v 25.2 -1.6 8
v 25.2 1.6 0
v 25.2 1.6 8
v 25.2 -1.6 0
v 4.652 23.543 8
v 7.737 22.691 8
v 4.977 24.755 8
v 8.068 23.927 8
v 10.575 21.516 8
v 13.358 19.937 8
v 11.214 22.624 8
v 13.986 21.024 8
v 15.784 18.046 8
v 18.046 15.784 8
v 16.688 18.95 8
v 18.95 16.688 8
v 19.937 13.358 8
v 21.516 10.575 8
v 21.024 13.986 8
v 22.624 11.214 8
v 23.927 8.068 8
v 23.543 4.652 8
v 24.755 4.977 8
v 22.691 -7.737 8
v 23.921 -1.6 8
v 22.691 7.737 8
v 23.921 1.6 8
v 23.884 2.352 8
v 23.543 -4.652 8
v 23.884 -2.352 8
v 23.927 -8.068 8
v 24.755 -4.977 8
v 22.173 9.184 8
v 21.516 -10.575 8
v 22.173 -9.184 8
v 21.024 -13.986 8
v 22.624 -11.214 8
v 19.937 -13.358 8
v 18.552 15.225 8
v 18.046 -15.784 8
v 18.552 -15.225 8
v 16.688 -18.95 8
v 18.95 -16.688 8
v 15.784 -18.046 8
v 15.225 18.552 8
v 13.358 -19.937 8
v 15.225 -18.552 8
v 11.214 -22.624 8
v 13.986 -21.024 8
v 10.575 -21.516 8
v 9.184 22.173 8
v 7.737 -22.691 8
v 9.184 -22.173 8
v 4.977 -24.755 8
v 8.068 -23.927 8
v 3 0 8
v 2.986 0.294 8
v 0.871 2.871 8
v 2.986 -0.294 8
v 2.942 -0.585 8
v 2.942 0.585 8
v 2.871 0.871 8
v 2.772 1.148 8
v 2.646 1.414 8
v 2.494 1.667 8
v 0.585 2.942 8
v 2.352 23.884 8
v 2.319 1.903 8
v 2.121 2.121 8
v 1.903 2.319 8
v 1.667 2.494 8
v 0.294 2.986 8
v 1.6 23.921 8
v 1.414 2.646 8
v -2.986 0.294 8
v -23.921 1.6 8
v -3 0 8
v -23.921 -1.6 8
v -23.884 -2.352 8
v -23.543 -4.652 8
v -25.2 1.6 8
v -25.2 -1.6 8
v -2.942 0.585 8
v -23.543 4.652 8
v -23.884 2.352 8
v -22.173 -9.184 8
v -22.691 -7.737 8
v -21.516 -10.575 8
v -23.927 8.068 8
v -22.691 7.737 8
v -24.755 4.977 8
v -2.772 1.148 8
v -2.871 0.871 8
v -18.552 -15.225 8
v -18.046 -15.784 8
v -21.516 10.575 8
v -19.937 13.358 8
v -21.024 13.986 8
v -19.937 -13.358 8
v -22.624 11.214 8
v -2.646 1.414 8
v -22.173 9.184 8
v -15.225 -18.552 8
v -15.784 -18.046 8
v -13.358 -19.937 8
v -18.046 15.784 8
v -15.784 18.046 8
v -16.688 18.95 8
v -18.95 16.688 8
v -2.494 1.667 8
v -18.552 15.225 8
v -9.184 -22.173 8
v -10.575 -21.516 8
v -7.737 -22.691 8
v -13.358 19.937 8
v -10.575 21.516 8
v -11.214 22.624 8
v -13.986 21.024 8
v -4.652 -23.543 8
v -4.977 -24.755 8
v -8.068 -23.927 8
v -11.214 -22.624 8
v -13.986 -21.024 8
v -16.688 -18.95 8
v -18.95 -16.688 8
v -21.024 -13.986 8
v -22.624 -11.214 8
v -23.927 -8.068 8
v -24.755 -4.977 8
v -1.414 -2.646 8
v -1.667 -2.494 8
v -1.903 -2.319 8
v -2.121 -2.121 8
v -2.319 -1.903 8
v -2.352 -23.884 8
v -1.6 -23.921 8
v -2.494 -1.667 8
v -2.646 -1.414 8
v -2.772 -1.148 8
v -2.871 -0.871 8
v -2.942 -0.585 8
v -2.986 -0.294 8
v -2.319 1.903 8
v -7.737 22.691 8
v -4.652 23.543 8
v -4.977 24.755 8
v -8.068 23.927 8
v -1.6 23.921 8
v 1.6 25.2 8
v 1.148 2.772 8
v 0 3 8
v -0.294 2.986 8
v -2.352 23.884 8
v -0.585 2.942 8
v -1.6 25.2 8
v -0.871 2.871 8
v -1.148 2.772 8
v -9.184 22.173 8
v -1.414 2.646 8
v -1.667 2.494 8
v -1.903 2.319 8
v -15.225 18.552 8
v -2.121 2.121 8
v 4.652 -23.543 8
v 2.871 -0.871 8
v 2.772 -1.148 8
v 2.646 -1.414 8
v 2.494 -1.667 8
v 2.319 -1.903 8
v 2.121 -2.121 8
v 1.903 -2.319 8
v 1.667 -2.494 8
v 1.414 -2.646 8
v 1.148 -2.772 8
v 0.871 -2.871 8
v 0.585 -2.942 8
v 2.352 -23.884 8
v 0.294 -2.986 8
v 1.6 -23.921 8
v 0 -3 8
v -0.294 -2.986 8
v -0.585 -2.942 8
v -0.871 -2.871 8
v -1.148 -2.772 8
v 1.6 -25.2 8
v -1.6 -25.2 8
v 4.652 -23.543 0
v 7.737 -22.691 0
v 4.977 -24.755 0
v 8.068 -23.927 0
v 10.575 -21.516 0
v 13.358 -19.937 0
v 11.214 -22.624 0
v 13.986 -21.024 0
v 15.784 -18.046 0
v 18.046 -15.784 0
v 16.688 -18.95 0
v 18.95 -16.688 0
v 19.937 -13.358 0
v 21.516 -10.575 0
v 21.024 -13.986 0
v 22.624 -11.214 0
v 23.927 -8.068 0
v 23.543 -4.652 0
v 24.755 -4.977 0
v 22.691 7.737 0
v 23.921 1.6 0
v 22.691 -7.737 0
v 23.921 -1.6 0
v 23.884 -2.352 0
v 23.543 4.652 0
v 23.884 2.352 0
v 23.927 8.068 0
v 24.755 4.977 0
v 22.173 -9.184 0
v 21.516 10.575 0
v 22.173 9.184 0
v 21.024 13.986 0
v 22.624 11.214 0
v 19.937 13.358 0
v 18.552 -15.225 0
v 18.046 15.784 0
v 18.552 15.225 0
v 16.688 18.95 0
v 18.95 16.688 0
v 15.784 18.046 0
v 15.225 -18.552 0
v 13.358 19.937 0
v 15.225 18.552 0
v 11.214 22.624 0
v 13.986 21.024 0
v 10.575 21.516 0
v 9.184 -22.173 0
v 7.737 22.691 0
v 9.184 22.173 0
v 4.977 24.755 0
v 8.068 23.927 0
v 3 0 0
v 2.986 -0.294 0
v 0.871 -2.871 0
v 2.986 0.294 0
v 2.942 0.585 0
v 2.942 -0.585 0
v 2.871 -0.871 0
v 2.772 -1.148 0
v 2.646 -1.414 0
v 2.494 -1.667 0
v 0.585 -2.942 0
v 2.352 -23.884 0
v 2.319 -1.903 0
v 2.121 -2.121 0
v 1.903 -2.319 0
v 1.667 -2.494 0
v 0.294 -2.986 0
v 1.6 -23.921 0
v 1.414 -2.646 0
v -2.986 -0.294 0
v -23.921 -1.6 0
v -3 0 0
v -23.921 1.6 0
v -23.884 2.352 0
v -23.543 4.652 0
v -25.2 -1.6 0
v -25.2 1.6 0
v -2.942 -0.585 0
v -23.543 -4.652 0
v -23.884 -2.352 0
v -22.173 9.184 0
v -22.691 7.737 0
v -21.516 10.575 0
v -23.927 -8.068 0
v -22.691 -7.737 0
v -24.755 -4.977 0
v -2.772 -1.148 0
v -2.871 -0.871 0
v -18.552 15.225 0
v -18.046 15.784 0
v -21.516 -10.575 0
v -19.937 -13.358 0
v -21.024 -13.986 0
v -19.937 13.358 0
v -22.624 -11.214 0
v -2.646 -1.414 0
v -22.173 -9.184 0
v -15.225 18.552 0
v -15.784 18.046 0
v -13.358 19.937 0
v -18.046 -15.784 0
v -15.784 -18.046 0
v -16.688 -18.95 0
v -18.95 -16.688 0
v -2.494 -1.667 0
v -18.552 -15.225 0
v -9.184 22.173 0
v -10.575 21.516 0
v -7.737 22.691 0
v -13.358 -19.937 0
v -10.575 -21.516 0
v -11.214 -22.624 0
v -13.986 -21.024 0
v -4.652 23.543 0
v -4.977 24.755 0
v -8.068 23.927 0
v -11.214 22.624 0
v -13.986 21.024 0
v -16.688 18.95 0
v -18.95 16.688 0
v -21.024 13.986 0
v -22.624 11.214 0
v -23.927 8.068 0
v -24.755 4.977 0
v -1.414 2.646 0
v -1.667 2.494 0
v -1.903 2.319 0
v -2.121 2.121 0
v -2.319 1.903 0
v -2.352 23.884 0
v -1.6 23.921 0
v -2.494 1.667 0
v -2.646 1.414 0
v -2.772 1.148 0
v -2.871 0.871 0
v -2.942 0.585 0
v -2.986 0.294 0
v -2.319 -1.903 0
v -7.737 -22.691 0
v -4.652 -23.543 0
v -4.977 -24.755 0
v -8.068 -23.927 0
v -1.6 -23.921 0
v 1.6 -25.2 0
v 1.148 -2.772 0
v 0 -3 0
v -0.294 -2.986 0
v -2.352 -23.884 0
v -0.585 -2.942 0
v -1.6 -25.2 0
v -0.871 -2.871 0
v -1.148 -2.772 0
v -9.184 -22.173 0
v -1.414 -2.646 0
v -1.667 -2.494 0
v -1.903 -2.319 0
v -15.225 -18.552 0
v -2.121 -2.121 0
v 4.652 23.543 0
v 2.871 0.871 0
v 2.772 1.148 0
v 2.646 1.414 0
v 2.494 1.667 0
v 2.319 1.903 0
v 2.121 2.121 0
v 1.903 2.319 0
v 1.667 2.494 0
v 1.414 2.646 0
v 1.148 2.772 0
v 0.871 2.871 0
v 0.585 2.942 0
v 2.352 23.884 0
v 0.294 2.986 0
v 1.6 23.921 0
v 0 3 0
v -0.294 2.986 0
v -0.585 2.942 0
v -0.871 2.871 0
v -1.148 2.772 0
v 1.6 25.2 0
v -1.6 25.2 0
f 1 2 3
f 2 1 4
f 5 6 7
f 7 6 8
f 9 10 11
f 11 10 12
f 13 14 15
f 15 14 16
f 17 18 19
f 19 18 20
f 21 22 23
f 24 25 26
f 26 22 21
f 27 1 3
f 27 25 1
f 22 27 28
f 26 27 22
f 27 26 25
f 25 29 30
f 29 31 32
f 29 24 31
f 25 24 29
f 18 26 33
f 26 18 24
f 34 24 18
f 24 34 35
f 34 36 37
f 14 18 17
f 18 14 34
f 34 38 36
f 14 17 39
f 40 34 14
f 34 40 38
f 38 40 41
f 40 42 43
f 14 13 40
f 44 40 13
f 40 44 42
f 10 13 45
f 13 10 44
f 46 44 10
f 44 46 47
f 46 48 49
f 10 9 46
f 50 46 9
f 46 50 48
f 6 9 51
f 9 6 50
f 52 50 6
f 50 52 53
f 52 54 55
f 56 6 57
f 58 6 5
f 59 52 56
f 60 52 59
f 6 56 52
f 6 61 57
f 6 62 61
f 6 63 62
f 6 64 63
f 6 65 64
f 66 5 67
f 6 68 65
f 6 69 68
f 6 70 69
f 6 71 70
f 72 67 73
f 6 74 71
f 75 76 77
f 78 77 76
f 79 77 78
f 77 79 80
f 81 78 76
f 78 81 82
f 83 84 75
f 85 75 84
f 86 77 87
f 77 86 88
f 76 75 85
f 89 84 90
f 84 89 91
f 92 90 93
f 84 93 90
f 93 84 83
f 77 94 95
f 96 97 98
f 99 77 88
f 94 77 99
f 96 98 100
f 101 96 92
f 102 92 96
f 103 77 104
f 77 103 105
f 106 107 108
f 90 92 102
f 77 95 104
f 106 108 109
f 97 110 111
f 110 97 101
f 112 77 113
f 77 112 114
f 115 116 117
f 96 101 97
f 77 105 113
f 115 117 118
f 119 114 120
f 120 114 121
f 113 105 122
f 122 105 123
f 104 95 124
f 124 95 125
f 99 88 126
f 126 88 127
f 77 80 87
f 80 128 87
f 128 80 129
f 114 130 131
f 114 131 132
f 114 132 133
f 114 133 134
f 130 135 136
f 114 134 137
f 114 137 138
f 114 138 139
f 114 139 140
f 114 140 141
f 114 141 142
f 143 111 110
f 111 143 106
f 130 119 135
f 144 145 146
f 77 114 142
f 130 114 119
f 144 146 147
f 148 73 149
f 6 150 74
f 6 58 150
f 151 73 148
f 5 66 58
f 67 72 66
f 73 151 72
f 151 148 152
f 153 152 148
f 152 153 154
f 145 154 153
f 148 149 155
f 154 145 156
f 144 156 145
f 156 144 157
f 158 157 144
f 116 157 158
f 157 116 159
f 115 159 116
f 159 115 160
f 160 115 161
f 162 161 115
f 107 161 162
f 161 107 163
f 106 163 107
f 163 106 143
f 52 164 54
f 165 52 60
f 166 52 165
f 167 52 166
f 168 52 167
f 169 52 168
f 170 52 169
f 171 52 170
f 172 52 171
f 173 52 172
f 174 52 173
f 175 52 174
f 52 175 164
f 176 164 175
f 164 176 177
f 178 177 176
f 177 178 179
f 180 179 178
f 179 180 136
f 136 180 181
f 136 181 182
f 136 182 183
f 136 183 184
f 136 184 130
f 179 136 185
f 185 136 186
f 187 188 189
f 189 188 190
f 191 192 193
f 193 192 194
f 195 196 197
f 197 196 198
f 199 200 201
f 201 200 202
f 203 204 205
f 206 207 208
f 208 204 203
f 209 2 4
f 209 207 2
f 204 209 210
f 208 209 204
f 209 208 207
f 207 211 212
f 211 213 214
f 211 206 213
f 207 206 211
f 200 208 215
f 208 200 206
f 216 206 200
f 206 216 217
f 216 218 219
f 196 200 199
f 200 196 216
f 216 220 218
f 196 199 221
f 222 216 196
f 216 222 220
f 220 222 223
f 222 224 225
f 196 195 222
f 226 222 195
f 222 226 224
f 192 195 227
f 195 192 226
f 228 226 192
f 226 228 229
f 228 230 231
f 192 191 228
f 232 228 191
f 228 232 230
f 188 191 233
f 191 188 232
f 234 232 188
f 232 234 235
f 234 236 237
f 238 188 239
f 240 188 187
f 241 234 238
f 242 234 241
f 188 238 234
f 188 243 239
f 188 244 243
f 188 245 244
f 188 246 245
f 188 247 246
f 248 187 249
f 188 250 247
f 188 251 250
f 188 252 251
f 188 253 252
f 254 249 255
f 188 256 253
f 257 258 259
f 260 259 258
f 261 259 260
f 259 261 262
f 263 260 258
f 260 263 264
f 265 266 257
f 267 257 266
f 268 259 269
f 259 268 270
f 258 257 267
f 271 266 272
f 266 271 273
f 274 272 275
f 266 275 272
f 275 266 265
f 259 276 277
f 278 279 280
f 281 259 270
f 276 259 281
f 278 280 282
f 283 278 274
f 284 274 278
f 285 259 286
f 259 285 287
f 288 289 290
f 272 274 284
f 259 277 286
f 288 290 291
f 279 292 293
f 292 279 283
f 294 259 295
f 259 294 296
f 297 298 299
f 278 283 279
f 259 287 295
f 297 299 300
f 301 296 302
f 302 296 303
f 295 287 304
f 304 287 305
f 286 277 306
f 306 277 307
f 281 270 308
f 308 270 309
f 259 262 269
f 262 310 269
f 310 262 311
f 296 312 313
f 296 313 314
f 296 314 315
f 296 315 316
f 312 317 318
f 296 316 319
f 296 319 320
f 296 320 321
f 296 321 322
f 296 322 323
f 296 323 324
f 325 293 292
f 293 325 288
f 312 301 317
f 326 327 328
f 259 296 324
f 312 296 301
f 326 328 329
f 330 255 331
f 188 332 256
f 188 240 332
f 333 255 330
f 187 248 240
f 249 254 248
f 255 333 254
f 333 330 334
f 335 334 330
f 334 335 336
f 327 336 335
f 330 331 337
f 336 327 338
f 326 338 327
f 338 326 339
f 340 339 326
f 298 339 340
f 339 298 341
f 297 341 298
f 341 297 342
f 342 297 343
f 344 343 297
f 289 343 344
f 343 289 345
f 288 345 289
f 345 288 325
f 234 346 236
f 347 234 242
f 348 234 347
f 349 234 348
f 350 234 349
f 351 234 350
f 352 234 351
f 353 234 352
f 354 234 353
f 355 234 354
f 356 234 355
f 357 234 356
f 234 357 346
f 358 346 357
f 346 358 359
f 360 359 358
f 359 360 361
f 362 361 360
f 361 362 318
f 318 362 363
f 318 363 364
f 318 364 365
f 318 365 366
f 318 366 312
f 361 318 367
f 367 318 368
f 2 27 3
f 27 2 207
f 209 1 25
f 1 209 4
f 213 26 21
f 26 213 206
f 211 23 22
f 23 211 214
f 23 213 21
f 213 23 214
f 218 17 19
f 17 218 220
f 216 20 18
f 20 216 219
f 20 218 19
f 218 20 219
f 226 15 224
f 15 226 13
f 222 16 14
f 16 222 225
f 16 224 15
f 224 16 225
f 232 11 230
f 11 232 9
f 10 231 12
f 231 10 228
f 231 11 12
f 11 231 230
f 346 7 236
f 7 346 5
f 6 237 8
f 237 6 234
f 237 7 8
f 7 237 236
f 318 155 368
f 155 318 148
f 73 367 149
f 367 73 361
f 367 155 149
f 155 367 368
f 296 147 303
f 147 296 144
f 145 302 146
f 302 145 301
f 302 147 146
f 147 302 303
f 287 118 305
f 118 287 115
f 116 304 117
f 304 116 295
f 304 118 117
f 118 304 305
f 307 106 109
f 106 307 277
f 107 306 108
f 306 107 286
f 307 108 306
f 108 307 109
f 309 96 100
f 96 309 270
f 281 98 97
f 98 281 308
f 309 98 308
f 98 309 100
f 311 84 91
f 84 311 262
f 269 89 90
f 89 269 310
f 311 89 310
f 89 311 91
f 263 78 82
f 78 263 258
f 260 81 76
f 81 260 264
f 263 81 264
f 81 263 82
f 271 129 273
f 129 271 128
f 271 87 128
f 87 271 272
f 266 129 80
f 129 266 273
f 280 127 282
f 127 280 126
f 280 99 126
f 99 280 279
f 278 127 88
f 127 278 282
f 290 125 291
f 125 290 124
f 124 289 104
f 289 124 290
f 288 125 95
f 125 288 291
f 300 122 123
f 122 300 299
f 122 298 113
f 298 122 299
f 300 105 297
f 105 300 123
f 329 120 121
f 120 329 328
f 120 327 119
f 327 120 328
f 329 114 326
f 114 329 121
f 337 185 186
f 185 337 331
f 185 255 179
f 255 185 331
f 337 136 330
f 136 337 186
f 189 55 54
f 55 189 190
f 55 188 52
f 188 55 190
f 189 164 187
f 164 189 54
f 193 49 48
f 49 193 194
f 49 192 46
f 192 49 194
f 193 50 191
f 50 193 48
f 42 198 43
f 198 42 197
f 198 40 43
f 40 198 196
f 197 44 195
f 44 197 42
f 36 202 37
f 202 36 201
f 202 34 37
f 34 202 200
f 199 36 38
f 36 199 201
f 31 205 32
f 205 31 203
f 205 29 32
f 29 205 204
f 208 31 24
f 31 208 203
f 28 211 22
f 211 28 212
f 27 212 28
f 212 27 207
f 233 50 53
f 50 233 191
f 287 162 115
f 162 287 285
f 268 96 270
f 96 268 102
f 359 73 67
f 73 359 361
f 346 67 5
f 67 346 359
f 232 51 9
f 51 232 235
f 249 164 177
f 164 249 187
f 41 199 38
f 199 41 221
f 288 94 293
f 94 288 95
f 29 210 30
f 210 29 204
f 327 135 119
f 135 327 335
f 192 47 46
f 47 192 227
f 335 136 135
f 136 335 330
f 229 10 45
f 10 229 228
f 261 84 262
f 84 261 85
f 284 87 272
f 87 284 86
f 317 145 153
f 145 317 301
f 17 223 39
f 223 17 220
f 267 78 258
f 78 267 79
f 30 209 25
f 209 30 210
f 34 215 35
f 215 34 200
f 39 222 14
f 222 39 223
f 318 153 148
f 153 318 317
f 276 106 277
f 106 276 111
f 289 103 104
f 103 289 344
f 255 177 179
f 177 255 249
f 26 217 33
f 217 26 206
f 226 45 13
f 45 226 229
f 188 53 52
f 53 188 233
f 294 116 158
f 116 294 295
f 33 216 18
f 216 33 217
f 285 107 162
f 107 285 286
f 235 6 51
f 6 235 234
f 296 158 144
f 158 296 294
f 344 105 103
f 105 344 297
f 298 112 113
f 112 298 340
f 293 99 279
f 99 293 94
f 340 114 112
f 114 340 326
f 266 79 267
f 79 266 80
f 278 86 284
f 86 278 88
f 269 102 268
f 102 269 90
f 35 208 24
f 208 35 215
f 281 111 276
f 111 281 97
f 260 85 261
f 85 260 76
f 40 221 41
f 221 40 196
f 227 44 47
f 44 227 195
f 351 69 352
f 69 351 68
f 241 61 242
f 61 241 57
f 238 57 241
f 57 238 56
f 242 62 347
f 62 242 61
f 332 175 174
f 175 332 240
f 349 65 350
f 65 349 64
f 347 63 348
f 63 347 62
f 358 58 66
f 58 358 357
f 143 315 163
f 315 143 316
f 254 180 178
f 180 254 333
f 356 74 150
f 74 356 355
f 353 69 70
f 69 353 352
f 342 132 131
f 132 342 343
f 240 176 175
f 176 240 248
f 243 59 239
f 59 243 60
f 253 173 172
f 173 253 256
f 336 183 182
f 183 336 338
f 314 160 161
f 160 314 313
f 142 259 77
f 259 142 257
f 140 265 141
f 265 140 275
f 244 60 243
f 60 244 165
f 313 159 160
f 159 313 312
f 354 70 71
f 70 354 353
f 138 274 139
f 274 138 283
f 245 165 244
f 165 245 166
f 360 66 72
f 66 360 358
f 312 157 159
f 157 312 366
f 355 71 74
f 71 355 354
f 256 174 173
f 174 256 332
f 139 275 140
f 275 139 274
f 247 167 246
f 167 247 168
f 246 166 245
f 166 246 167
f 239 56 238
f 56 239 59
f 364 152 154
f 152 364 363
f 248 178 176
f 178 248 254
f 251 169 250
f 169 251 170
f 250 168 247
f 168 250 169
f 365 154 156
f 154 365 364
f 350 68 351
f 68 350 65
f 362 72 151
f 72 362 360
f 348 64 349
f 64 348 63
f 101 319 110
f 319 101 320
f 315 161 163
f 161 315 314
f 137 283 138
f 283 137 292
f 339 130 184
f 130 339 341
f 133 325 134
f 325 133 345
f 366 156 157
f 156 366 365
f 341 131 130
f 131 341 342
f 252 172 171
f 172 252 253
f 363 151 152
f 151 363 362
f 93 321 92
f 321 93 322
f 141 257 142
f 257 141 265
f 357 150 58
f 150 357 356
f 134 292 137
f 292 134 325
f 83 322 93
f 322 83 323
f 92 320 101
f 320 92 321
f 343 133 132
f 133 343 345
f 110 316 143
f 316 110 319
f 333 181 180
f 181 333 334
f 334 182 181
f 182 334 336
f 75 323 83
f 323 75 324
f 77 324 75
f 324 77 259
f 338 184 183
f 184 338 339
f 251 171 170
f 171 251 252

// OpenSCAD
// Generated by Text-to-CAD from prompt:
// a 24 tooth gear
$fn = 64;

module Gear() {
difference() {
    union() {
        cylinder(h=8, r=24, $fn=$fn);
        for (i = [0 : 23]) rotate([0, 0, 360.0 / 24 * i]) {
            translate([22.8, -1.6, 0]) {
                cube([2.4, 3.2, 8]);
            }
        }
    }
    cylinder(h=8, r=3, $fn=$fn);
}
}

Gear();
